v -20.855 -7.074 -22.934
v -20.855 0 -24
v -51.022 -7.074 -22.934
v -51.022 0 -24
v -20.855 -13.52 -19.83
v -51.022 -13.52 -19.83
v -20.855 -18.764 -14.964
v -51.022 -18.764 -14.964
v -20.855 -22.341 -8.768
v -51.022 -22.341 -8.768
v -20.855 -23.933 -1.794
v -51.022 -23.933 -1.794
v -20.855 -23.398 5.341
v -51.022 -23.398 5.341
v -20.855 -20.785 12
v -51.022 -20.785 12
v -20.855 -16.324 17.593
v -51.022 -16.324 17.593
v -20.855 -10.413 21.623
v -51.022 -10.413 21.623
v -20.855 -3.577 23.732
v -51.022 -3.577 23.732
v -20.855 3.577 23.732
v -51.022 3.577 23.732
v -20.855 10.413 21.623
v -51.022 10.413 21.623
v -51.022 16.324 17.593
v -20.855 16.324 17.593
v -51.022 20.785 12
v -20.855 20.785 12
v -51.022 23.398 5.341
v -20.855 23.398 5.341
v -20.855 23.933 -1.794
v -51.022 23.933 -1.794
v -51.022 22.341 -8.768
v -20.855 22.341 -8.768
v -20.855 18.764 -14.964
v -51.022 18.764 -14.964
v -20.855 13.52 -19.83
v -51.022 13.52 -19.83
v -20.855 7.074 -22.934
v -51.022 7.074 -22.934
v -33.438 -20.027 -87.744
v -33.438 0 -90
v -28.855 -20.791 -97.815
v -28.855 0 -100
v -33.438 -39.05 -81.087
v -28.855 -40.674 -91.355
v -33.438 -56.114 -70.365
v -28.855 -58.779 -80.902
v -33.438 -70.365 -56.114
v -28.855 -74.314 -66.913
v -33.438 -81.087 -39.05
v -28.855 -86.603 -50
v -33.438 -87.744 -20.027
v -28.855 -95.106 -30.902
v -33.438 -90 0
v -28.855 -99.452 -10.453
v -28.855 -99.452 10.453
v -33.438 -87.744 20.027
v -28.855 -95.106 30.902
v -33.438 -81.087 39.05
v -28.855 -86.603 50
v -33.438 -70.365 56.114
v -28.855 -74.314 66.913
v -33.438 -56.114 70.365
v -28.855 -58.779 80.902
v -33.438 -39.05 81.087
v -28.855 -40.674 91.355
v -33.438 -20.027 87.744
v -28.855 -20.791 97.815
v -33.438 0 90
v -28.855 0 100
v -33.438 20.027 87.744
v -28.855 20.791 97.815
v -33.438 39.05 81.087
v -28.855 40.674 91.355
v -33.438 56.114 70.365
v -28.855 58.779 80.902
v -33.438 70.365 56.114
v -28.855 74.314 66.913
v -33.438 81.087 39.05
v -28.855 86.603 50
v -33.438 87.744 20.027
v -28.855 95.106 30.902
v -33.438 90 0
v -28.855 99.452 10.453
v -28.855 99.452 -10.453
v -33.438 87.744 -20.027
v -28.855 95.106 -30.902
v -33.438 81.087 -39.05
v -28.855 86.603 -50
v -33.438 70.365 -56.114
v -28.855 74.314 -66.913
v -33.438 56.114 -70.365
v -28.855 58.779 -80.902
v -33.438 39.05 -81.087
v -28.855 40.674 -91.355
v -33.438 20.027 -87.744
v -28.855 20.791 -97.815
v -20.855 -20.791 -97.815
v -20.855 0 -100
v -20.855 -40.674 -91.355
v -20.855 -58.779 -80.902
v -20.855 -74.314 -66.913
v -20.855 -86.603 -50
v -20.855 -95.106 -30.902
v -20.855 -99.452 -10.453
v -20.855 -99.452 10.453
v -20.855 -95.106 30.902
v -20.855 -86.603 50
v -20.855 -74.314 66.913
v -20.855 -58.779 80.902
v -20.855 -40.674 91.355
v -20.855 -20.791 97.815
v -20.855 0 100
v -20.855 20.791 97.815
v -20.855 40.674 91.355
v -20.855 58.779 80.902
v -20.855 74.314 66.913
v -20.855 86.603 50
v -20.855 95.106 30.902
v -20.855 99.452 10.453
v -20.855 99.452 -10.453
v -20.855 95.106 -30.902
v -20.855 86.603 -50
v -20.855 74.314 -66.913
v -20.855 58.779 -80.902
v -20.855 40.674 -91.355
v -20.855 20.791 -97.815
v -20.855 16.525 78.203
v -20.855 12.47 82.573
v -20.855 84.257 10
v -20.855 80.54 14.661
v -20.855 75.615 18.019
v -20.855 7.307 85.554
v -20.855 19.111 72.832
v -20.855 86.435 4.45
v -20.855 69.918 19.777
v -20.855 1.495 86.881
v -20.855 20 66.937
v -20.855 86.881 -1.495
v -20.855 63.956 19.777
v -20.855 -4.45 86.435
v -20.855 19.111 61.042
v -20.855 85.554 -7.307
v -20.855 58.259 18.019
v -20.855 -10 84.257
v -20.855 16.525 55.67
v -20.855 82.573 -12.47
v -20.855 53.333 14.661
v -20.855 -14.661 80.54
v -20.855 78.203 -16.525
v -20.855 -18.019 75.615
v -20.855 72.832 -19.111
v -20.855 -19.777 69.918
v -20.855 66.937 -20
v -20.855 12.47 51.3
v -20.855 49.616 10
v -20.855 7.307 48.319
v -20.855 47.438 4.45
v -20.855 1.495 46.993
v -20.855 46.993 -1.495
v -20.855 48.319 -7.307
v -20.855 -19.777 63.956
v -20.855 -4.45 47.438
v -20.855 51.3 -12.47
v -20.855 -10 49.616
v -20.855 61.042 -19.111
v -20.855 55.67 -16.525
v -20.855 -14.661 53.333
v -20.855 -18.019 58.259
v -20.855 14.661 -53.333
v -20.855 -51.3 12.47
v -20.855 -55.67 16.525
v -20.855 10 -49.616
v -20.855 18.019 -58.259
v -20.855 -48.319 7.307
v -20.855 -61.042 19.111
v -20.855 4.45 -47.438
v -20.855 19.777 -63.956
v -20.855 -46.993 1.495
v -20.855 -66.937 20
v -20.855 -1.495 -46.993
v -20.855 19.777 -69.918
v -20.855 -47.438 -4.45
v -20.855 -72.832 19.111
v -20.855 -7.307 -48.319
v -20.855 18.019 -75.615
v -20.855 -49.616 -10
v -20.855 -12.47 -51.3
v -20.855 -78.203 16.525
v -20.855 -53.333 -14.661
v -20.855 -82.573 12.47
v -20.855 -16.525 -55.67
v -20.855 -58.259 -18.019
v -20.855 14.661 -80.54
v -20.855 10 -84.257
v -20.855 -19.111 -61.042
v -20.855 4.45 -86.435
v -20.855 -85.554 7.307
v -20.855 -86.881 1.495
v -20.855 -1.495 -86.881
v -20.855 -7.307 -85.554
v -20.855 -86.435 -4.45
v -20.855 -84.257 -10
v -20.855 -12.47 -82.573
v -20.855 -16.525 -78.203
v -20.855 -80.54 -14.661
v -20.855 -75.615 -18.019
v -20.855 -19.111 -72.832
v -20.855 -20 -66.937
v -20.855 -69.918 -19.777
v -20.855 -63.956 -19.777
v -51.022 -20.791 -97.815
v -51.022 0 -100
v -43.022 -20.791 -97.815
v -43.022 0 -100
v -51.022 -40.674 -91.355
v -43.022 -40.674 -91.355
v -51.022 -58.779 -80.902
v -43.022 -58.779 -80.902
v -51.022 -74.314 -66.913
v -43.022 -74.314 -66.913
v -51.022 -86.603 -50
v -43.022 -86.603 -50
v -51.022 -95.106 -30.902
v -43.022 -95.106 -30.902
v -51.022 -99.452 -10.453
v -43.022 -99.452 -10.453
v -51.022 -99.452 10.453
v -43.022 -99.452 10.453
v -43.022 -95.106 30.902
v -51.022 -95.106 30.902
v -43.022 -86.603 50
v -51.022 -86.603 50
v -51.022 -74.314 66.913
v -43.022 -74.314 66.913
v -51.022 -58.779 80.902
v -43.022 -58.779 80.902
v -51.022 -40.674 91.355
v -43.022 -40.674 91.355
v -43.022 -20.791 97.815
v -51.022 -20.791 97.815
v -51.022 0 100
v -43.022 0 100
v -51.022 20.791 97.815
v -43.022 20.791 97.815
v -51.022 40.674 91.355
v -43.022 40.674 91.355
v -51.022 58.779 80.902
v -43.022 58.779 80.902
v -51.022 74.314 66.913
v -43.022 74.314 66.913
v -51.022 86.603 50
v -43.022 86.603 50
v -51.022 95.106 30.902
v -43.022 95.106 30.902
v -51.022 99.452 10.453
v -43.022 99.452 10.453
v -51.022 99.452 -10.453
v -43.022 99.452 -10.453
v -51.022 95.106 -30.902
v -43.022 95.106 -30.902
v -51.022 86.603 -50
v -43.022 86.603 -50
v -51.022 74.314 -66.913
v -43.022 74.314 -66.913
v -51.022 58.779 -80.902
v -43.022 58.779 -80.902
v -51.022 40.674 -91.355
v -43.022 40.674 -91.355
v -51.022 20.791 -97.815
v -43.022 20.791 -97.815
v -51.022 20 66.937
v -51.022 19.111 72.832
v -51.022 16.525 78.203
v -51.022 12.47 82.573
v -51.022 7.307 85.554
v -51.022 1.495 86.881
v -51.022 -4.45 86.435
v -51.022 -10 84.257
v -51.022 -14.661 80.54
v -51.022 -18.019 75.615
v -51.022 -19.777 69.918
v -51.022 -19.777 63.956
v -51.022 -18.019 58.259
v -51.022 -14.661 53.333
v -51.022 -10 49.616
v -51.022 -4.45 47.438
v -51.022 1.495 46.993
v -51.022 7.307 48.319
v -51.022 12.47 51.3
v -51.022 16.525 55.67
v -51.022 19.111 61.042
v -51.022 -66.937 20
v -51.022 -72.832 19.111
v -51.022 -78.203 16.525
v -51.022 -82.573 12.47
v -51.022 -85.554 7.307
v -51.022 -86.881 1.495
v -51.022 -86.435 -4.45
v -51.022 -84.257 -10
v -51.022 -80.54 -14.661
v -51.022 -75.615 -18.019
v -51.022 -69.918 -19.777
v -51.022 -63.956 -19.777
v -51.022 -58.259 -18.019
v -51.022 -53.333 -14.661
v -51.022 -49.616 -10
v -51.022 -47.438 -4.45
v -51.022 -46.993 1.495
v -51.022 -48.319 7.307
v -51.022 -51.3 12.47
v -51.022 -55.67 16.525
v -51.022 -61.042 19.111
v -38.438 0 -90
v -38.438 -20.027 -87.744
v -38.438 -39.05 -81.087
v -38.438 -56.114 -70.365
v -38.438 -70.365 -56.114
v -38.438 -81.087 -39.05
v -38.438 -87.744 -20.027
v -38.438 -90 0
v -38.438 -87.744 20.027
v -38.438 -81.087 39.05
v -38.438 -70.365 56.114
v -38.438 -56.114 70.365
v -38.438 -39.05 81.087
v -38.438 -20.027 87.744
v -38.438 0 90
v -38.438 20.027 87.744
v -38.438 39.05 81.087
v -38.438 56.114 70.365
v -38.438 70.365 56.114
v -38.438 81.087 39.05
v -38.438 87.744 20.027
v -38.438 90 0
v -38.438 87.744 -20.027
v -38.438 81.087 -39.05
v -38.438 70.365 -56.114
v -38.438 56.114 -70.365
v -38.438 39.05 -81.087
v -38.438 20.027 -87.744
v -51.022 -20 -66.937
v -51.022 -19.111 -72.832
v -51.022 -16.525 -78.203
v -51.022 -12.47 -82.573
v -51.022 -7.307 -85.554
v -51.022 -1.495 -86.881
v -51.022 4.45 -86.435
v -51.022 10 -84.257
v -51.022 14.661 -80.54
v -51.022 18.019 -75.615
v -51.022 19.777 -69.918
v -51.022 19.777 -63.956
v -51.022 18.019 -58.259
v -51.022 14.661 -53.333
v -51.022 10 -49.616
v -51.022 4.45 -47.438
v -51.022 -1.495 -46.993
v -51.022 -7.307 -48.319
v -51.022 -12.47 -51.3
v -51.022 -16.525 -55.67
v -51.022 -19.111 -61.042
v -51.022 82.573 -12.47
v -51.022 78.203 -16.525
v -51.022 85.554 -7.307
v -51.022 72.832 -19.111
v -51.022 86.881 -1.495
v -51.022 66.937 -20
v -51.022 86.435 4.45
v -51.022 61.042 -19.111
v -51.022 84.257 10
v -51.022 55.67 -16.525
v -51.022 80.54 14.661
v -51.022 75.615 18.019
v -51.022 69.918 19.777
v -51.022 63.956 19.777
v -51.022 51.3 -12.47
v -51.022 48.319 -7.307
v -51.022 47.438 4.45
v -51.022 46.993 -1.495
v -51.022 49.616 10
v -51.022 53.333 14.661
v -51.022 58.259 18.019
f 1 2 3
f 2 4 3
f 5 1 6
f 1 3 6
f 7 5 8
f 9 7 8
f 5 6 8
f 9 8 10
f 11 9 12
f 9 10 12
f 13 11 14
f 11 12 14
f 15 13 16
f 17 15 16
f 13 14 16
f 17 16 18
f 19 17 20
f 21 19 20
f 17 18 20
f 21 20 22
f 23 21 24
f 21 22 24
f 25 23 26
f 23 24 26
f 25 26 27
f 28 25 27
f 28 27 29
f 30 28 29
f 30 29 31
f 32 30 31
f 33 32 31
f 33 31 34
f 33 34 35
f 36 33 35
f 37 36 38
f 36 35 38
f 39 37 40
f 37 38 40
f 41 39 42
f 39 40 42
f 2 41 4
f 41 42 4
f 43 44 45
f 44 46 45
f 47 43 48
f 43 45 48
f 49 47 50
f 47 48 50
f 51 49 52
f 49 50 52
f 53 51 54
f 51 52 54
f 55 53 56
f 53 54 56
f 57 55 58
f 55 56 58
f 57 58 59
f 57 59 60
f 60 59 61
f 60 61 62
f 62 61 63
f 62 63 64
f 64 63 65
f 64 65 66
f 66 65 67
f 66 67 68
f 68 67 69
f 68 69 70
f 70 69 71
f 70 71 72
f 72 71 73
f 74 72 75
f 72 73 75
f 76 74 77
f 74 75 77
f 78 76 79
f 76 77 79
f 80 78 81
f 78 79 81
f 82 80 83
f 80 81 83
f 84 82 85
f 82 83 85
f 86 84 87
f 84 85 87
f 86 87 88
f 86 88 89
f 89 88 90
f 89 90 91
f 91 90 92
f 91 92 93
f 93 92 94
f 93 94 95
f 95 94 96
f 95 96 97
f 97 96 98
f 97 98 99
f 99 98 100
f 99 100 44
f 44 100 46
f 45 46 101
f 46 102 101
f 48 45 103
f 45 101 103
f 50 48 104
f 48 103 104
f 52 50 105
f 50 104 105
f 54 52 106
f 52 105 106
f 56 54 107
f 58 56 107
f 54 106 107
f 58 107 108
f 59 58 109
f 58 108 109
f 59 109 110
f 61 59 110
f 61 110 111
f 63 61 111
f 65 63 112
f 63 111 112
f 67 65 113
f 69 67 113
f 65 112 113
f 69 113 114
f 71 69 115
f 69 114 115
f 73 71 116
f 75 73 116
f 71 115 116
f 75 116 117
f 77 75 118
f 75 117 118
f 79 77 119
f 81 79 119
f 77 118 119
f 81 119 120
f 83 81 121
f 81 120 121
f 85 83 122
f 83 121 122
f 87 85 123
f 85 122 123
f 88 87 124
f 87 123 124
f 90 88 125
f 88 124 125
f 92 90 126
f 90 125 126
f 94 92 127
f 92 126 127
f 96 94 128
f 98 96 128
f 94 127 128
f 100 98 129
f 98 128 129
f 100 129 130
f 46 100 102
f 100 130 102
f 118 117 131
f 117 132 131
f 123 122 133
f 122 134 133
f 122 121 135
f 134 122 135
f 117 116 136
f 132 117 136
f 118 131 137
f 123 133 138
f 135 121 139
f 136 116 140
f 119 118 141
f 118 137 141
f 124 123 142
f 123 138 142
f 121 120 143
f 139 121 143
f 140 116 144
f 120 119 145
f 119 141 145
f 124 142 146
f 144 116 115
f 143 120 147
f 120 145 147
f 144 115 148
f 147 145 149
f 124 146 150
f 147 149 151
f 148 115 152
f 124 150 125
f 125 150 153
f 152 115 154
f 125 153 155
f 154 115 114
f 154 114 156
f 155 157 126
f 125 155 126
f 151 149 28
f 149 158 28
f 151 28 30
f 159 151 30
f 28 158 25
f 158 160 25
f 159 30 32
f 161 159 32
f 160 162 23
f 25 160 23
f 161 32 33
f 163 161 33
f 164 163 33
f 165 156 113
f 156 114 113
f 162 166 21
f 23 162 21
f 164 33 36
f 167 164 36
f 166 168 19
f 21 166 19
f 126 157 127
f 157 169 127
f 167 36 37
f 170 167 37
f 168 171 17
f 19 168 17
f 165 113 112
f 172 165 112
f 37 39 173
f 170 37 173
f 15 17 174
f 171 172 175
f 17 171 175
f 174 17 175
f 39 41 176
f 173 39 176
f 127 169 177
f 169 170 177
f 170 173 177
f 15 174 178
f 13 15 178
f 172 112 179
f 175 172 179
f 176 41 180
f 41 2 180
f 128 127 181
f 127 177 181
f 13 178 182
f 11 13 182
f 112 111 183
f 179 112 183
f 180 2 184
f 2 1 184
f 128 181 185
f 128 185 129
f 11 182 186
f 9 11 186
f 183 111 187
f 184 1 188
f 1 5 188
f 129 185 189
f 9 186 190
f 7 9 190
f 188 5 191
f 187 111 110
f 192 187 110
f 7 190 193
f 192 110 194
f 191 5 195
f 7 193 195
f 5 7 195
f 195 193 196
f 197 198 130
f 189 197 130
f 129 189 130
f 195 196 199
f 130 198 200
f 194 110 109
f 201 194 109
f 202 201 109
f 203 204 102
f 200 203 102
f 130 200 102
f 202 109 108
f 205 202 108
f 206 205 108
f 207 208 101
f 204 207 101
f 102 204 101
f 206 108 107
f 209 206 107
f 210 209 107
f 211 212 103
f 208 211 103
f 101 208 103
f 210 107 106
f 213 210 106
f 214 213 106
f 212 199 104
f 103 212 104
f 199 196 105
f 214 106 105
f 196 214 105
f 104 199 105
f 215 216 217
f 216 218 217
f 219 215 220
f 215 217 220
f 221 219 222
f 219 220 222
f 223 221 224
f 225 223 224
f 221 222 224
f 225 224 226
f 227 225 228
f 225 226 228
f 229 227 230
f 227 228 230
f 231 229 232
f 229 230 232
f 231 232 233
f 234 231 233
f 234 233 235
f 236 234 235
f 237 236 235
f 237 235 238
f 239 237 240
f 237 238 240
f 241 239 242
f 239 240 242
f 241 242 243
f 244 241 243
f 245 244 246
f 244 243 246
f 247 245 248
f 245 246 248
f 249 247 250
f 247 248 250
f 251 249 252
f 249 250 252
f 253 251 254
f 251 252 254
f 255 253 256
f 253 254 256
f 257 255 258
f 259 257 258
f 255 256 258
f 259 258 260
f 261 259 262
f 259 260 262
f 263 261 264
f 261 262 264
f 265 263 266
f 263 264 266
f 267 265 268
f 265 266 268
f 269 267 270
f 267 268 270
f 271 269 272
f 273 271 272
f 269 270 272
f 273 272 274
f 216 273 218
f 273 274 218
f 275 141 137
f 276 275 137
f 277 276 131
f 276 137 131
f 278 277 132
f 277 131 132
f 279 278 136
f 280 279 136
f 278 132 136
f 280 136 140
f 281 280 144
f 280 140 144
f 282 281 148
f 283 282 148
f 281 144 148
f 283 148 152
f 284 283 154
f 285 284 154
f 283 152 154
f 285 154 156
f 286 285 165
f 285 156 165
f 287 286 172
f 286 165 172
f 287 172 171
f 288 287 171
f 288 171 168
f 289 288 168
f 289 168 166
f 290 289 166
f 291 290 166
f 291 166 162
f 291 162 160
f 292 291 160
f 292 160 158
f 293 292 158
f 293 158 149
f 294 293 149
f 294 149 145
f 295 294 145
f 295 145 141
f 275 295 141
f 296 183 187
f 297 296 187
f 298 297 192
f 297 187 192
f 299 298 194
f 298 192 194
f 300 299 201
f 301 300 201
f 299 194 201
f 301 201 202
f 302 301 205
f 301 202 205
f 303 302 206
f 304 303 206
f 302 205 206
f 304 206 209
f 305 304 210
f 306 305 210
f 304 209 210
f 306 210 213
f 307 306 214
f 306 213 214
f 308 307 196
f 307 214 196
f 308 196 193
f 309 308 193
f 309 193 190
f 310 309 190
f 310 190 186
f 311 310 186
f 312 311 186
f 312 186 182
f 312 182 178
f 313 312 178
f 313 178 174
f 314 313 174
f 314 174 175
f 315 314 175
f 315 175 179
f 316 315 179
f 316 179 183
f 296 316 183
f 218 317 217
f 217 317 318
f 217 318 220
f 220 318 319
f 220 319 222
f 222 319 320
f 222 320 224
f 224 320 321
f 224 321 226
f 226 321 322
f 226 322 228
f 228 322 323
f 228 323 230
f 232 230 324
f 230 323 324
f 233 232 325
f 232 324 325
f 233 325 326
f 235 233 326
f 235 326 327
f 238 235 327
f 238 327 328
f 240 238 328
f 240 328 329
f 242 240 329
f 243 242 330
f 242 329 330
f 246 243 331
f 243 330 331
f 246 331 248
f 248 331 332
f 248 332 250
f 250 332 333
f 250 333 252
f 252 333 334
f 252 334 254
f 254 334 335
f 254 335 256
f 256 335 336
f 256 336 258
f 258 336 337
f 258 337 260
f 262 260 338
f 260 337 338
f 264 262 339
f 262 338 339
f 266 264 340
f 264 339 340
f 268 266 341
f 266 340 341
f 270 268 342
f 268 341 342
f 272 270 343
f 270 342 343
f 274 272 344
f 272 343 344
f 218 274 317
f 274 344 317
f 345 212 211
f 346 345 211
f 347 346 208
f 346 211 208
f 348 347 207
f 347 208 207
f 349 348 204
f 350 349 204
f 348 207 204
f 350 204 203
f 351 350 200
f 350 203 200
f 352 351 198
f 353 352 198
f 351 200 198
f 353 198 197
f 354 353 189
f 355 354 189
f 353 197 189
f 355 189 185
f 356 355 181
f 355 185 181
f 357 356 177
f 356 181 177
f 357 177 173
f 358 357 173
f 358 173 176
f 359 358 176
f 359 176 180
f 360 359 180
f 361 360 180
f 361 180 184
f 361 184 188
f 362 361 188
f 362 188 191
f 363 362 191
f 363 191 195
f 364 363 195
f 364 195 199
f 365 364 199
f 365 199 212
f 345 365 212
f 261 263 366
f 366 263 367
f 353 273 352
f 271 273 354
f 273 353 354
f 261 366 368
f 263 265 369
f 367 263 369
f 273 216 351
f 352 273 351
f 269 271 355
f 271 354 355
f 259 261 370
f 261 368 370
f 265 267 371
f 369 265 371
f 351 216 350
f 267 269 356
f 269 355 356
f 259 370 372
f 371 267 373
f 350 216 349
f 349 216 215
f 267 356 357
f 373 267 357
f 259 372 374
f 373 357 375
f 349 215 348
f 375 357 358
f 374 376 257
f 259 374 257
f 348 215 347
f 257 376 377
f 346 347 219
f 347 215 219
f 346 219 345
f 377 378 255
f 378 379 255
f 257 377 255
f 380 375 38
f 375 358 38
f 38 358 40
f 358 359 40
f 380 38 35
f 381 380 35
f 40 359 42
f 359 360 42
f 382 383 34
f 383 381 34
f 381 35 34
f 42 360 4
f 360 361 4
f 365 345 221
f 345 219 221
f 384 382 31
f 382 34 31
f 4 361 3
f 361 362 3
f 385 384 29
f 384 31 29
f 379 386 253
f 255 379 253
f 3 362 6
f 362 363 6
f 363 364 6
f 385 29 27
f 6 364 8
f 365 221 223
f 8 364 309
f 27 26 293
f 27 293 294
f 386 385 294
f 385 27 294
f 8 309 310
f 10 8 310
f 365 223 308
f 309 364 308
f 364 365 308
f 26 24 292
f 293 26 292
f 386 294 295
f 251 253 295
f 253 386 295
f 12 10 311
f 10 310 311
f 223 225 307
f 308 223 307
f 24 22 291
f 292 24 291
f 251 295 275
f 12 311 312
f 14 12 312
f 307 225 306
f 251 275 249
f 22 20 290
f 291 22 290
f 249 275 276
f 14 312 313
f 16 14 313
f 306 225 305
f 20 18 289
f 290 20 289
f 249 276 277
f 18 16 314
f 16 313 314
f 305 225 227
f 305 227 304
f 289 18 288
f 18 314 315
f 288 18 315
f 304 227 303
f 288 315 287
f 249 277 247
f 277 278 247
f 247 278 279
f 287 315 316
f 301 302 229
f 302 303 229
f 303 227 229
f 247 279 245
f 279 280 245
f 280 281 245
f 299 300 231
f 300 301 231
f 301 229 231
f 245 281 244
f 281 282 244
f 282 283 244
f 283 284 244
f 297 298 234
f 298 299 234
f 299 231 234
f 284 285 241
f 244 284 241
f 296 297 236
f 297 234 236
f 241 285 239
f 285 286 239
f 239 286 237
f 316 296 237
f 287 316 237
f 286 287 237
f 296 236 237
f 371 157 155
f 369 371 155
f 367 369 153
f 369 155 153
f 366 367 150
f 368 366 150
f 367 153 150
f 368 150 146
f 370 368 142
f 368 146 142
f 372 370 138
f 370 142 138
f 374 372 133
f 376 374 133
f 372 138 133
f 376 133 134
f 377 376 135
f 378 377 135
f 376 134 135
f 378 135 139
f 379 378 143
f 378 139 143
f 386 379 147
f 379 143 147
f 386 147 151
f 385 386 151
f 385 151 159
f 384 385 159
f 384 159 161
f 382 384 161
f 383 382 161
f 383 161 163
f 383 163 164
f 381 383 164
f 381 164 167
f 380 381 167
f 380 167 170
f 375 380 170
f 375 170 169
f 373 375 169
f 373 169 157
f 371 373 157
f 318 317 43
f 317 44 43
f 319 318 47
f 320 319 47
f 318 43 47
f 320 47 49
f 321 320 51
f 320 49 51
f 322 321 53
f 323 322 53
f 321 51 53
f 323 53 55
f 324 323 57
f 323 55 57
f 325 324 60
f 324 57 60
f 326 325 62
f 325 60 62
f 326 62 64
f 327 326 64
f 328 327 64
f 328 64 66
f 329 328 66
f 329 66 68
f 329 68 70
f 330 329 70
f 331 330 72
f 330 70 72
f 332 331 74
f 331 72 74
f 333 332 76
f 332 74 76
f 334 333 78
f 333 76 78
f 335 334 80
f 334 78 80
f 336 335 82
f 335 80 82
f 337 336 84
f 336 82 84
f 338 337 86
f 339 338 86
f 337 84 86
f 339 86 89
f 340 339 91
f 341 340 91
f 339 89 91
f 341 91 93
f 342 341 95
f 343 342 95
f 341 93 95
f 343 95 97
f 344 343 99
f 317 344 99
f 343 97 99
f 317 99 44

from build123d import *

# Parameters (mm, degrees)
SKETCH2_R          = 20
CUT_EXTRUDE1_DEPTH = 103
CIRPATTERN1_COUNT  = 4


with BuildPart() as part:
    # Sketch1 → Revolve1 (revolve)
    with BuildSketch(Plane.XY, mode=Mode.PRIVATE) as revolve1_sk:
        Polygon((-20.854858804, 24), (-51.021525471, 24), (-51.021525471, 100), (-43.021525471, 100), (-38.438192137, 90), (-33.438192137, 90), (-28.854858804, 100), (-20.854858804, 100), align=None)
    revolve(revolve1_sk.sketch.rotate(Axis((0, 0, 0), (-1, 0, 0)), 90), axis=Axis((0, 0, 0), (-1, 0, 0)))

    # Sketch2 → Cut-Extrude1 (cut)
    with BuildSketch(Plane(origin=(-20.854858804, 0, 0), x_dir=(0, 0, -1), z_dir=(1, 0, 0))):
        with Locations((0, 66.936858639)):
            Circle(SKETCH2_R)
    cut_extrude1 = extrude(amount=-CUT_EXTRUDE1_DEPTH, mode=Mode.SUBTRACT)

    # CirPattern1: Cut-Extrude1 ×4 about axis
    cirpattern1_axis = Axis((0, 0, 0), (1, 0, 0))
    for i in range(1, CIRPATTERN1_COUNT):
        add(cut_extrude1.rotate(cirpattern1_axis, i * 360 / CIRPATTERN1_COUNT), mode=Mode.SUBTRACT)


solid = part.part
